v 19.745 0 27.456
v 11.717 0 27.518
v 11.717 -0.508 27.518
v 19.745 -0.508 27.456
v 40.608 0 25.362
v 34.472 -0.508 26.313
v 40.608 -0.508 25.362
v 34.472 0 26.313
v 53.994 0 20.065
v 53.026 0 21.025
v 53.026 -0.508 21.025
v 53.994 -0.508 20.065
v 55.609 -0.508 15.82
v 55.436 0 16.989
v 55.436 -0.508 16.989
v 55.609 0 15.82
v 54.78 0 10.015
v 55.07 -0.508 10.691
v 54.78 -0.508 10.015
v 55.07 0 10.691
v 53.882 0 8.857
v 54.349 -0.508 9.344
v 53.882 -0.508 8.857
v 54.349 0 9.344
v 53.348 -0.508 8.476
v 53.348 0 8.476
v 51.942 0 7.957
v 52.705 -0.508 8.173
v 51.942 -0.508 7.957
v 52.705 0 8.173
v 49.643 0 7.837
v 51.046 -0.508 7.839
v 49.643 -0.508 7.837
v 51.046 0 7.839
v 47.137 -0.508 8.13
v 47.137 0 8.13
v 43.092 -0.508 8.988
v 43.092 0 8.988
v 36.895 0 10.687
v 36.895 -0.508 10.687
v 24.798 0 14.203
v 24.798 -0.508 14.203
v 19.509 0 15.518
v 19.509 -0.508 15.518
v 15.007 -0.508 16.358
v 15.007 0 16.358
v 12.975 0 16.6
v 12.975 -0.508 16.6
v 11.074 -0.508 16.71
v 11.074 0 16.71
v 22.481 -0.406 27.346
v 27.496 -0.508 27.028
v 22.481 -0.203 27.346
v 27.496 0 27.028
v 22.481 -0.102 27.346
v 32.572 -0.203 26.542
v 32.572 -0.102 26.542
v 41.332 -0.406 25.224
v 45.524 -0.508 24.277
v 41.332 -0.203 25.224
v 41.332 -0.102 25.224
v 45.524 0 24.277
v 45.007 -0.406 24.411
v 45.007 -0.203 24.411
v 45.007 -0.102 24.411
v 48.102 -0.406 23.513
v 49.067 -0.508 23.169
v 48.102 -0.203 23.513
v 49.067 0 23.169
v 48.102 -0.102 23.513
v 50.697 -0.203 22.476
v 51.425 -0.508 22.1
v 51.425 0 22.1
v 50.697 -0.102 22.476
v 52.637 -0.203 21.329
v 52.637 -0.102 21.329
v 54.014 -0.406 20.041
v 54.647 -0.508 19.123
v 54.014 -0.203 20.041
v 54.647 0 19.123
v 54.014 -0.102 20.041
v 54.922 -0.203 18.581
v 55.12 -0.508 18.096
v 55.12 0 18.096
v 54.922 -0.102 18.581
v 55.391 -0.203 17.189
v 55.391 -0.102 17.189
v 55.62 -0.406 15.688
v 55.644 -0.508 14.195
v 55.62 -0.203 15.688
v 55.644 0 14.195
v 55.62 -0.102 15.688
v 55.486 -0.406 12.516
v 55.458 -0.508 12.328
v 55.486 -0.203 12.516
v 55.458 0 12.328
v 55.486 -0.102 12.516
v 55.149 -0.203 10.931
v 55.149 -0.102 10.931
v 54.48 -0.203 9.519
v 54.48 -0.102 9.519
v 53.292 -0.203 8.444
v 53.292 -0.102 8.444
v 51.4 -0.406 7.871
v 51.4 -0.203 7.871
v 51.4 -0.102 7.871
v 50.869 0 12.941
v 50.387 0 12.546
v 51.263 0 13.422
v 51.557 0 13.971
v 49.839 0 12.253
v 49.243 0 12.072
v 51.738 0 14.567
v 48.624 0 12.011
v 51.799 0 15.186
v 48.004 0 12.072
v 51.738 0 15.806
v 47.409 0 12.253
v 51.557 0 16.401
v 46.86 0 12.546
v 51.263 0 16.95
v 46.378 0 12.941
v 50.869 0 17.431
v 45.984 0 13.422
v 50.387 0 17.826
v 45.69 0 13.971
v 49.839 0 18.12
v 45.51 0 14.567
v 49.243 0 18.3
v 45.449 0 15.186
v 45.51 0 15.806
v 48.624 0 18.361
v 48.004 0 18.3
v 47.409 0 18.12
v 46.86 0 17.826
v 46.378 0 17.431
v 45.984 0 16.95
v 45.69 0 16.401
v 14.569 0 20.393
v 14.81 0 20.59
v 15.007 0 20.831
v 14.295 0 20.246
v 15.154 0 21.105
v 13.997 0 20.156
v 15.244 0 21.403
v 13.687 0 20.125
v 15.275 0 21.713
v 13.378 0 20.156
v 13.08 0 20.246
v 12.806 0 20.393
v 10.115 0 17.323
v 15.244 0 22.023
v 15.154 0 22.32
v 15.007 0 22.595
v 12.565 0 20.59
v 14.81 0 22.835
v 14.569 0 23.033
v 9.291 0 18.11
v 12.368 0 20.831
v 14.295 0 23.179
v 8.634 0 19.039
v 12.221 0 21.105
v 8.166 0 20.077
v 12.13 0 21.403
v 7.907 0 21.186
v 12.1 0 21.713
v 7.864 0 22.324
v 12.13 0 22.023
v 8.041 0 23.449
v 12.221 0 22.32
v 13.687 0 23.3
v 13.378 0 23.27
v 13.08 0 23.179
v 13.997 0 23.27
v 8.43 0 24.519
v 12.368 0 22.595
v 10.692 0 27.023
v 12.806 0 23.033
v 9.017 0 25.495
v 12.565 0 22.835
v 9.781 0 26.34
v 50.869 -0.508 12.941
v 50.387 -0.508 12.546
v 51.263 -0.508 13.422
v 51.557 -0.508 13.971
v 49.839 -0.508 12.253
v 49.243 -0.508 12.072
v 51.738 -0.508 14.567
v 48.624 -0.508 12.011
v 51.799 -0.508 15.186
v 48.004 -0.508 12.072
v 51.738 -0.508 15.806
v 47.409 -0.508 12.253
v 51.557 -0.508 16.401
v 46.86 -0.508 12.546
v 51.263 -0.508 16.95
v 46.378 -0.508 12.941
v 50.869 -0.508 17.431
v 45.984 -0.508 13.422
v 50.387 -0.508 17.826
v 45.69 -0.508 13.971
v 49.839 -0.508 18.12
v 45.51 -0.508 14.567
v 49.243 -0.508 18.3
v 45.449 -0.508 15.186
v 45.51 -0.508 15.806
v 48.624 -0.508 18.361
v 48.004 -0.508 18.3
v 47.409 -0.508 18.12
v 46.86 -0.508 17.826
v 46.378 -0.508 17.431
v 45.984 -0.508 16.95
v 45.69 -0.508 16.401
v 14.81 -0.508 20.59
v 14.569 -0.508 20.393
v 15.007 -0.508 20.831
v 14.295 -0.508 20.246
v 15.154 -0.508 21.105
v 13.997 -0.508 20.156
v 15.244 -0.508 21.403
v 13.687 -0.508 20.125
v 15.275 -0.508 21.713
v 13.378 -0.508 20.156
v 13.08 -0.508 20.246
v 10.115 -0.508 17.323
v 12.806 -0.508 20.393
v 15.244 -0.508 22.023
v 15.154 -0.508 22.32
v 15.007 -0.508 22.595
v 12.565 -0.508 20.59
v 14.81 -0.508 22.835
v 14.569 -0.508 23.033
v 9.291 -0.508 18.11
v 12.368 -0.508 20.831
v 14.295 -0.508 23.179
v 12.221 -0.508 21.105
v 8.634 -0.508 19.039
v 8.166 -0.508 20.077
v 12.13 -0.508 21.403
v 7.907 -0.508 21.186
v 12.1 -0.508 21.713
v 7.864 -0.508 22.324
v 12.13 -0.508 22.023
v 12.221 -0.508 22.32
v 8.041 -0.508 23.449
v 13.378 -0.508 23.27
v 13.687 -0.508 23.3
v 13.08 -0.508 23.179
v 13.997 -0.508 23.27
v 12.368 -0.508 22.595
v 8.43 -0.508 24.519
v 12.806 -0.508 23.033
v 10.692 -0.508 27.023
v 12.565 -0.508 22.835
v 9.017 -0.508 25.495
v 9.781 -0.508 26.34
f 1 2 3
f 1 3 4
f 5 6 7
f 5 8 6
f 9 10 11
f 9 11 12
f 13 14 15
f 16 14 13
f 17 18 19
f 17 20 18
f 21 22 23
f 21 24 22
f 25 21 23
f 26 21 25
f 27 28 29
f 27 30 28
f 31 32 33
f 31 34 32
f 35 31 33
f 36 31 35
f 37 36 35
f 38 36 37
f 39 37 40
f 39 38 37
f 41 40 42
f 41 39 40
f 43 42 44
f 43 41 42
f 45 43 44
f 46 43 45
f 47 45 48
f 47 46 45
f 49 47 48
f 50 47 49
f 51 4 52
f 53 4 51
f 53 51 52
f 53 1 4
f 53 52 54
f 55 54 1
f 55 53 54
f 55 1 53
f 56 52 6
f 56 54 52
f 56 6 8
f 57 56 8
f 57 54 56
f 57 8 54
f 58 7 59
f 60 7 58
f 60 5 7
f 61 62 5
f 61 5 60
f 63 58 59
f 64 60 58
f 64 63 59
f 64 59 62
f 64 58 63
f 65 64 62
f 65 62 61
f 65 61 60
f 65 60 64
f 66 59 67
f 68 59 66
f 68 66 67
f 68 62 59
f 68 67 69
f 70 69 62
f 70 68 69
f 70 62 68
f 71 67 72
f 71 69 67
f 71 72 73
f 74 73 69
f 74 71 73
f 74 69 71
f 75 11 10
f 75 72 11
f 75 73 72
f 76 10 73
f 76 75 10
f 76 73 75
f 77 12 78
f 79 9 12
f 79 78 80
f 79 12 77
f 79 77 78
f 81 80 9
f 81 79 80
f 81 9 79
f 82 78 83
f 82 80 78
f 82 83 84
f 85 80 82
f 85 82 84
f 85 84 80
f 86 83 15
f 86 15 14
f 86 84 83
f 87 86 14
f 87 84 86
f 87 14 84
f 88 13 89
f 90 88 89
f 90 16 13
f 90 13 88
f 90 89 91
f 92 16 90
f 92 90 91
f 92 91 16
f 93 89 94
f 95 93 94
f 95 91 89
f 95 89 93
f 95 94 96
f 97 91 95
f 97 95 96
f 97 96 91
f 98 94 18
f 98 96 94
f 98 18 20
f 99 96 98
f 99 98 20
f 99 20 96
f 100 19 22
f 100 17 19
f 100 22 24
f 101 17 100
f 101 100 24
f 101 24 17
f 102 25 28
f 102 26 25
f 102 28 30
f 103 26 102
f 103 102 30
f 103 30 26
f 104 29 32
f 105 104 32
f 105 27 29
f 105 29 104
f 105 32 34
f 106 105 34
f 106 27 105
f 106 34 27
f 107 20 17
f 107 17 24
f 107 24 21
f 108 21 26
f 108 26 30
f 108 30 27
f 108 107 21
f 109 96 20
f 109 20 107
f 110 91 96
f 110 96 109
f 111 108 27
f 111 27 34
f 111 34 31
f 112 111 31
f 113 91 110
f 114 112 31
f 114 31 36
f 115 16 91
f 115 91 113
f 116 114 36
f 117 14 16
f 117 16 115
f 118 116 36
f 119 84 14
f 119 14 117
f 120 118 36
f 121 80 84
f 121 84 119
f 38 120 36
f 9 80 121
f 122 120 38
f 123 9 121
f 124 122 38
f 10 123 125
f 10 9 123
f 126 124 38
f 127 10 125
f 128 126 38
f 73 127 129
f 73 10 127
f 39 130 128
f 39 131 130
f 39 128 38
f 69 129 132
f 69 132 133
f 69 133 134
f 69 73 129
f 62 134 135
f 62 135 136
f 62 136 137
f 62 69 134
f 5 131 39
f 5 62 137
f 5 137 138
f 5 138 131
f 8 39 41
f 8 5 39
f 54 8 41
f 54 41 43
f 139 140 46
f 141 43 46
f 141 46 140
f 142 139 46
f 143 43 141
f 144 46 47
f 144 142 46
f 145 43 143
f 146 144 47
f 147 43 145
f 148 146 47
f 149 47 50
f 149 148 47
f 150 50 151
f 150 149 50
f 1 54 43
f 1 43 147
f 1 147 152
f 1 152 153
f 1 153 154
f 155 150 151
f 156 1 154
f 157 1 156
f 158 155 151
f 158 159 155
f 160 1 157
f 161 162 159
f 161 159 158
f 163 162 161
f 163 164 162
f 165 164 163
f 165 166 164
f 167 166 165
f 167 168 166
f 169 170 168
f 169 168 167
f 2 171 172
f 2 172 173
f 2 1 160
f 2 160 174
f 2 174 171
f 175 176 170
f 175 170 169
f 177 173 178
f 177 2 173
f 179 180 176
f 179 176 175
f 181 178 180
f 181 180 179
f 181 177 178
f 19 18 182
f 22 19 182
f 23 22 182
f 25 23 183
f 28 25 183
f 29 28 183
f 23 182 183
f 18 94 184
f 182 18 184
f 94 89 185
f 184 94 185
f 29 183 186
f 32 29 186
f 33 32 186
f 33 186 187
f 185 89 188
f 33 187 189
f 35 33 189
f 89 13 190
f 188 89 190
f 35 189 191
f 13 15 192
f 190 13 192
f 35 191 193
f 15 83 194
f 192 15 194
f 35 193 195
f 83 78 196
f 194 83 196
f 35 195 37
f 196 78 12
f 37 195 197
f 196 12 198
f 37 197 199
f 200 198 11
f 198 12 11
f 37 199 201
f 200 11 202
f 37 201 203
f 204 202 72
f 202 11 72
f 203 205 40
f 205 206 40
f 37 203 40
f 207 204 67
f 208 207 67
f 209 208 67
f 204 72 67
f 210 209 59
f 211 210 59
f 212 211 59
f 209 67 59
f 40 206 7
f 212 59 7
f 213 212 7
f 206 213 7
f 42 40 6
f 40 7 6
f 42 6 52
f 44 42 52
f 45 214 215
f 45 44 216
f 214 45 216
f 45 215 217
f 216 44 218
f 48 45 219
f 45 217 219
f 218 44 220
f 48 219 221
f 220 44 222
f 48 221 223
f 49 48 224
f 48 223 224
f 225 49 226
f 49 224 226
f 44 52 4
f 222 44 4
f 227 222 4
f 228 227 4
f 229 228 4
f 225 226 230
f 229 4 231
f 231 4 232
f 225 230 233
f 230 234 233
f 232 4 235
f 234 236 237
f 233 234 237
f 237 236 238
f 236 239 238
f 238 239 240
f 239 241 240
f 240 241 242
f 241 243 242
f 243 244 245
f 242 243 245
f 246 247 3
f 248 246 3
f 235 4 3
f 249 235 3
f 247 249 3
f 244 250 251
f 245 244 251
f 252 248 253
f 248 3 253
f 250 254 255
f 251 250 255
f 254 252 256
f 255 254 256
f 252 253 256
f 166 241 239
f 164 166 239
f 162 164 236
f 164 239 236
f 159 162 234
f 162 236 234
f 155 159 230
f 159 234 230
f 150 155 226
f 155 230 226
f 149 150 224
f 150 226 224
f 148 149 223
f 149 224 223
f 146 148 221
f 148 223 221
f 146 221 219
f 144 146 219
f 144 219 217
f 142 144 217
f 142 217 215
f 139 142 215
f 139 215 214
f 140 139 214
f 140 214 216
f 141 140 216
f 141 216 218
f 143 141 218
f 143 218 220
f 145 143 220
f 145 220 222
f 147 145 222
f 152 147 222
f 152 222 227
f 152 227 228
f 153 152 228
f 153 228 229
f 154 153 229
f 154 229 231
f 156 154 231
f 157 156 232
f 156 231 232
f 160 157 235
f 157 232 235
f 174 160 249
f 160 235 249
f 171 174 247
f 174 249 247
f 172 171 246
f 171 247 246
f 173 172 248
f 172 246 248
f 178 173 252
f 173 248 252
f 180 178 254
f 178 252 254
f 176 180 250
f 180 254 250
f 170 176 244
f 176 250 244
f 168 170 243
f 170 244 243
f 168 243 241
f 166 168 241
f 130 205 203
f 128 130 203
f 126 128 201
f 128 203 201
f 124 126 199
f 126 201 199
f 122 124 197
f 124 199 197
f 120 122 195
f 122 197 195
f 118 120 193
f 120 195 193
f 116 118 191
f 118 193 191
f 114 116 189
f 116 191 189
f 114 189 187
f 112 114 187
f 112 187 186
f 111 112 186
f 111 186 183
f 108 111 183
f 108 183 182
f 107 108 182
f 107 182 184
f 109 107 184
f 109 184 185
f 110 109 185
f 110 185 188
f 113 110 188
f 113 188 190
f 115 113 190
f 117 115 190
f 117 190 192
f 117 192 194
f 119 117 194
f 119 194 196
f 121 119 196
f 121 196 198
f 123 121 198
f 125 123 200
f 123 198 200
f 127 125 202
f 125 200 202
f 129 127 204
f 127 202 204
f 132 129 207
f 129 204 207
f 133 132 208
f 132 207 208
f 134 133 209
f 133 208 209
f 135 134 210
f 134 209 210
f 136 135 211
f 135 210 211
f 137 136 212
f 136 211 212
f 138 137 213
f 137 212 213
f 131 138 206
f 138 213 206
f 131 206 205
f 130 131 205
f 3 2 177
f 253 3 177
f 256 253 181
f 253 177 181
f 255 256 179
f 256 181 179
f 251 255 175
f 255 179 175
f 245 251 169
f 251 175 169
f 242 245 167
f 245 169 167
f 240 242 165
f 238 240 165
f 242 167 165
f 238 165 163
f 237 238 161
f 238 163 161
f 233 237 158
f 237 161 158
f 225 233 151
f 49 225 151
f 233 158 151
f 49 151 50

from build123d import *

# Parameters (mm, degrees)
F1_DEPTH = 0.508
F2_D     = 6.35
F3_D     = 3.175


with BuildPart() as f1:
    # F0 (on Front) → F1 (new body)
    with BuildSketch(Plane.XZ):
        with BuildLine():
            add(Edge.make_bspline(
                [(11.7170246186, 27.5181992918), (26.2255903847, 27.7629586116), (48.3846492687, 25.0700674705), (55.6356924136, 19.3540475045), (55.8687851234, 12.478221614), (52.7926576137, 3.0913798232), (22.8349964924, 16.4619868897), (11.0743273574, 16.709885222)],
                knots=[0.3296138166, 0.3296138166, 0.3296138166, 0.3296138166, 0.480499723, 0.5607025722, 0.6289296599, 0.6976911092, 0.8631531697, 0.8631531697, 0.8631531697, 0.8631531697], degree=3))
            ThreePointArc((11.7170246186, 27.5181992918), (7.864434674, 22.32402127), (11.0743273574, 16.709885222))
        make_face()
    extrude(amount=F1_DEPTH)

    # F2 (through all)
    with Locations(Plane(origin=(0, 0, 0), x_dir=(1, 0, 0), z_dir=(0, 1, 0))):
        with Locations((48.6235208809, -15.1863284409)):
            Hole(F2_D / 2)

    # F3 (through all)
    with Locations(Plane(origin=(0, 0, 0), x_dir=(1, 0, 0), z_dir=(0, 1, 0))):
        with Locations((13.6874951422, -21.7128396034)):
            Hole(F3_D / 2)


solid = f1.part
